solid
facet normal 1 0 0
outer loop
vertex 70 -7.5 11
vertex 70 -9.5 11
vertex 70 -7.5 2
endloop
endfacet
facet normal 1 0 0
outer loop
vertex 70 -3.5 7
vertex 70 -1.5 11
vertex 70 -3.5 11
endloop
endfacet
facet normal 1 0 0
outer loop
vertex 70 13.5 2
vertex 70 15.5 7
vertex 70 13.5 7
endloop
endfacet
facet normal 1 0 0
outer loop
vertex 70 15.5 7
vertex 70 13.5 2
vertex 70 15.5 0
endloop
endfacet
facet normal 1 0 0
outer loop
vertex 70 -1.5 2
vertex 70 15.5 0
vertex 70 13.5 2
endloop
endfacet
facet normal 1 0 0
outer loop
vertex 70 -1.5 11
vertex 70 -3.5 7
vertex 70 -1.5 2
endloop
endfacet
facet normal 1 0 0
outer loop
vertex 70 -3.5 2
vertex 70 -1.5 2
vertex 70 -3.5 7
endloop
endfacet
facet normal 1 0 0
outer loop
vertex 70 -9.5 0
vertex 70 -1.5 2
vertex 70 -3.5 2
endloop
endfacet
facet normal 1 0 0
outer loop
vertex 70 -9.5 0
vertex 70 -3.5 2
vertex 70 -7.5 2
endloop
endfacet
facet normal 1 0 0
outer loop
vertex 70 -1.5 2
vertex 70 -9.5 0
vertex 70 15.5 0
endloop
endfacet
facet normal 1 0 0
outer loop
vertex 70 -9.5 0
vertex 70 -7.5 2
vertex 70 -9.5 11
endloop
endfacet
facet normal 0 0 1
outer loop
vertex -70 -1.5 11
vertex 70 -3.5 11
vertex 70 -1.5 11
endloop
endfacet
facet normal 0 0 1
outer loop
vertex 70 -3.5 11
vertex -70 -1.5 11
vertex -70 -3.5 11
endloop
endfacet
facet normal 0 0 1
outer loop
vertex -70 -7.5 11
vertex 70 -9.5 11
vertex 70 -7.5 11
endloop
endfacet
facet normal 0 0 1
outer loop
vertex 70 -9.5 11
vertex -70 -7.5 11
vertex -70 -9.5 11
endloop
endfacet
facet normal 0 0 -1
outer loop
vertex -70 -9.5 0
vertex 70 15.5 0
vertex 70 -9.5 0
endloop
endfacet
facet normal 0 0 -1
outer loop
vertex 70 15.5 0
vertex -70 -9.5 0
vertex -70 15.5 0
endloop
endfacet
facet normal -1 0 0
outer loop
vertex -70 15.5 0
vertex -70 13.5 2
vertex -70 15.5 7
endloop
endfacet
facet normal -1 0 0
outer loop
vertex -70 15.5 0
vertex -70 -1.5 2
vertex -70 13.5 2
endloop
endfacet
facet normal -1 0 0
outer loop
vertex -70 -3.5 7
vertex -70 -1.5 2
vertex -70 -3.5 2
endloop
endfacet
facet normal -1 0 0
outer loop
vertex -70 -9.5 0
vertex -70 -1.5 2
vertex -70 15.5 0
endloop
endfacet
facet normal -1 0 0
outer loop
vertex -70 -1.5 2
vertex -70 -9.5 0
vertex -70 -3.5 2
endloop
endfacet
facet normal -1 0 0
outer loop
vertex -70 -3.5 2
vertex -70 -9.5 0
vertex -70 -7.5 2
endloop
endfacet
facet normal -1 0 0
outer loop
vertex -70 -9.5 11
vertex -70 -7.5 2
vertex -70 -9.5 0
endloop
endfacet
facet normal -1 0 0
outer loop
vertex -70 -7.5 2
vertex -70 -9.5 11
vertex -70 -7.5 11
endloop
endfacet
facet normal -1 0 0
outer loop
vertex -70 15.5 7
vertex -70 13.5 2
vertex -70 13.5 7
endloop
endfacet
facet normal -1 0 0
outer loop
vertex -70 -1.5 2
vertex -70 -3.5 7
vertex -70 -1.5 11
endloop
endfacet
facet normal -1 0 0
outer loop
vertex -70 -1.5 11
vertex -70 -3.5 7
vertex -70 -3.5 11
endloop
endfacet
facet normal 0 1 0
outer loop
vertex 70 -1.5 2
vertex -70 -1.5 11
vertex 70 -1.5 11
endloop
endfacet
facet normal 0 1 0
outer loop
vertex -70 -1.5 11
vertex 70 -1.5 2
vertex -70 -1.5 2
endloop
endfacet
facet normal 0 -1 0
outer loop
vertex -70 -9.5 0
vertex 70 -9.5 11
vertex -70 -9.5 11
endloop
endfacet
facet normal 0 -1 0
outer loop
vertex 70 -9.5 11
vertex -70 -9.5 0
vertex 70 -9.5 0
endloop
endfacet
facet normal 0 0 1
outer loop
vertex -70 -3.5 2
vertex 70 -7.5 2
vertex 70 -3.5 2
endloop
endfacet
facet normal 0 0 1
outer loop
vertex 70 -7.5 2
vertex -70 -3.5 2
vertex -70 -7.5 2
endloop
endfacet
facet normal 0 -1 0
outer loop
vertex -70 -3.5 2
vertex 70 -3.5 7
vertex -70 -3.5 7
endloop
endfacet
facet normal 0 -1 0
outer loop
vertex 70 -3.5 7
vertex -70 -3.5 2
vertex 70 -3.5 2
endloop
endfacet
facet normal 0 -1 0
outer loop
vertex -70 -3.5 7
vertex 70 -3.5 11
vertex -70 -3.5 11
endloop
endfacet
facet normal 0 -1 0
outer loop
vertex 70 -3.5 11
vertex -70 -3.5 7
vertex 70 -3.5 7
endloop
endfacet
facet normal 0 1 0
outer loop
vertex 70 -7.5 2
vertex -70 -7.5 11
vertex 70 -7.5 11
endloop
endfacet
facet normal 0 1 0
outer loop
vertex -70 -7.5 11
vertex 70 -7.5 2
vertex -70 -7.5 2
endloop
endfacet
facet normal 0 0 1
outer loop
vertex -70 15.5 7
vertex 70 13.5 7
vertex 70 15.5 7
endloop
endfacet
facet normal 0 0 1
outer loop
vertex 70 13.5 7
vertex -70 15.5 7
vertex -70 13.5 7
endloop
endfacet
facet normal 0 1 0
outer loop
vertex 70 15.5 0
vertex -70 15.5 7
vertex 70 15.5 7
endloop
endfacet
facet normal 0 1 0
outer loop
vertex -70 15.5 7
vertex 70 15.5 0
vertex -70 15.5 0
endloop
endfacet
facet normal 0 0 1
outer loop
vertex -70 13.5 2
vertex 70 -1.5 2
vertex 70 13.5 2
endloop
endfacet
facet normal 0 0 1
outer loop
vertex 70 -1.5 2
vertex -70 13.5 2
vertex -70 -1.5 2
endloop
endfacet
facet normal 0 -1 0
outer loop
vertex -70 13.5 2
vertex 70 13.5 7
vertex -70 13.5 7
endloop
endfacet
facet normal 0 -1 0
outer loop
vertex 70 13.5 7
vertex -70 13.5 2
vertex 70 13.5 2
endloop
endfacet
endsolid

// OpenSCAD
wall_thickness = 2;
tray_height = 7;
tray_width = 15;
clip_height = 11;
clip_width = 4;
holder_length = 140;

module marker_holder() {
  translate([-holder_length / 2, -(clip_width + tray_width) / 2, 0]) {
		union() {
      	difference() {
        		cube([holder_length, clip_width + 2 * wall_thickness, clip_height]);
        			translate([0, wall_thickness, wall_thickness]) {
          			cube([holder_length, clip_width, clip_height]);
      			}
    		}
    		translate([0, clip_width + wall_thickness, 0]) {
      		difference() {
        			cube([holder_length, tray_width + 2 * wall_thickness, tray_height]);
        				translate([0, wall_thickness, wall_thickness]) {
          				cube([holder_length, tray_width, tray_height]);
						}
        		}
      	}
    	}
  	}
}

marker_holder();

